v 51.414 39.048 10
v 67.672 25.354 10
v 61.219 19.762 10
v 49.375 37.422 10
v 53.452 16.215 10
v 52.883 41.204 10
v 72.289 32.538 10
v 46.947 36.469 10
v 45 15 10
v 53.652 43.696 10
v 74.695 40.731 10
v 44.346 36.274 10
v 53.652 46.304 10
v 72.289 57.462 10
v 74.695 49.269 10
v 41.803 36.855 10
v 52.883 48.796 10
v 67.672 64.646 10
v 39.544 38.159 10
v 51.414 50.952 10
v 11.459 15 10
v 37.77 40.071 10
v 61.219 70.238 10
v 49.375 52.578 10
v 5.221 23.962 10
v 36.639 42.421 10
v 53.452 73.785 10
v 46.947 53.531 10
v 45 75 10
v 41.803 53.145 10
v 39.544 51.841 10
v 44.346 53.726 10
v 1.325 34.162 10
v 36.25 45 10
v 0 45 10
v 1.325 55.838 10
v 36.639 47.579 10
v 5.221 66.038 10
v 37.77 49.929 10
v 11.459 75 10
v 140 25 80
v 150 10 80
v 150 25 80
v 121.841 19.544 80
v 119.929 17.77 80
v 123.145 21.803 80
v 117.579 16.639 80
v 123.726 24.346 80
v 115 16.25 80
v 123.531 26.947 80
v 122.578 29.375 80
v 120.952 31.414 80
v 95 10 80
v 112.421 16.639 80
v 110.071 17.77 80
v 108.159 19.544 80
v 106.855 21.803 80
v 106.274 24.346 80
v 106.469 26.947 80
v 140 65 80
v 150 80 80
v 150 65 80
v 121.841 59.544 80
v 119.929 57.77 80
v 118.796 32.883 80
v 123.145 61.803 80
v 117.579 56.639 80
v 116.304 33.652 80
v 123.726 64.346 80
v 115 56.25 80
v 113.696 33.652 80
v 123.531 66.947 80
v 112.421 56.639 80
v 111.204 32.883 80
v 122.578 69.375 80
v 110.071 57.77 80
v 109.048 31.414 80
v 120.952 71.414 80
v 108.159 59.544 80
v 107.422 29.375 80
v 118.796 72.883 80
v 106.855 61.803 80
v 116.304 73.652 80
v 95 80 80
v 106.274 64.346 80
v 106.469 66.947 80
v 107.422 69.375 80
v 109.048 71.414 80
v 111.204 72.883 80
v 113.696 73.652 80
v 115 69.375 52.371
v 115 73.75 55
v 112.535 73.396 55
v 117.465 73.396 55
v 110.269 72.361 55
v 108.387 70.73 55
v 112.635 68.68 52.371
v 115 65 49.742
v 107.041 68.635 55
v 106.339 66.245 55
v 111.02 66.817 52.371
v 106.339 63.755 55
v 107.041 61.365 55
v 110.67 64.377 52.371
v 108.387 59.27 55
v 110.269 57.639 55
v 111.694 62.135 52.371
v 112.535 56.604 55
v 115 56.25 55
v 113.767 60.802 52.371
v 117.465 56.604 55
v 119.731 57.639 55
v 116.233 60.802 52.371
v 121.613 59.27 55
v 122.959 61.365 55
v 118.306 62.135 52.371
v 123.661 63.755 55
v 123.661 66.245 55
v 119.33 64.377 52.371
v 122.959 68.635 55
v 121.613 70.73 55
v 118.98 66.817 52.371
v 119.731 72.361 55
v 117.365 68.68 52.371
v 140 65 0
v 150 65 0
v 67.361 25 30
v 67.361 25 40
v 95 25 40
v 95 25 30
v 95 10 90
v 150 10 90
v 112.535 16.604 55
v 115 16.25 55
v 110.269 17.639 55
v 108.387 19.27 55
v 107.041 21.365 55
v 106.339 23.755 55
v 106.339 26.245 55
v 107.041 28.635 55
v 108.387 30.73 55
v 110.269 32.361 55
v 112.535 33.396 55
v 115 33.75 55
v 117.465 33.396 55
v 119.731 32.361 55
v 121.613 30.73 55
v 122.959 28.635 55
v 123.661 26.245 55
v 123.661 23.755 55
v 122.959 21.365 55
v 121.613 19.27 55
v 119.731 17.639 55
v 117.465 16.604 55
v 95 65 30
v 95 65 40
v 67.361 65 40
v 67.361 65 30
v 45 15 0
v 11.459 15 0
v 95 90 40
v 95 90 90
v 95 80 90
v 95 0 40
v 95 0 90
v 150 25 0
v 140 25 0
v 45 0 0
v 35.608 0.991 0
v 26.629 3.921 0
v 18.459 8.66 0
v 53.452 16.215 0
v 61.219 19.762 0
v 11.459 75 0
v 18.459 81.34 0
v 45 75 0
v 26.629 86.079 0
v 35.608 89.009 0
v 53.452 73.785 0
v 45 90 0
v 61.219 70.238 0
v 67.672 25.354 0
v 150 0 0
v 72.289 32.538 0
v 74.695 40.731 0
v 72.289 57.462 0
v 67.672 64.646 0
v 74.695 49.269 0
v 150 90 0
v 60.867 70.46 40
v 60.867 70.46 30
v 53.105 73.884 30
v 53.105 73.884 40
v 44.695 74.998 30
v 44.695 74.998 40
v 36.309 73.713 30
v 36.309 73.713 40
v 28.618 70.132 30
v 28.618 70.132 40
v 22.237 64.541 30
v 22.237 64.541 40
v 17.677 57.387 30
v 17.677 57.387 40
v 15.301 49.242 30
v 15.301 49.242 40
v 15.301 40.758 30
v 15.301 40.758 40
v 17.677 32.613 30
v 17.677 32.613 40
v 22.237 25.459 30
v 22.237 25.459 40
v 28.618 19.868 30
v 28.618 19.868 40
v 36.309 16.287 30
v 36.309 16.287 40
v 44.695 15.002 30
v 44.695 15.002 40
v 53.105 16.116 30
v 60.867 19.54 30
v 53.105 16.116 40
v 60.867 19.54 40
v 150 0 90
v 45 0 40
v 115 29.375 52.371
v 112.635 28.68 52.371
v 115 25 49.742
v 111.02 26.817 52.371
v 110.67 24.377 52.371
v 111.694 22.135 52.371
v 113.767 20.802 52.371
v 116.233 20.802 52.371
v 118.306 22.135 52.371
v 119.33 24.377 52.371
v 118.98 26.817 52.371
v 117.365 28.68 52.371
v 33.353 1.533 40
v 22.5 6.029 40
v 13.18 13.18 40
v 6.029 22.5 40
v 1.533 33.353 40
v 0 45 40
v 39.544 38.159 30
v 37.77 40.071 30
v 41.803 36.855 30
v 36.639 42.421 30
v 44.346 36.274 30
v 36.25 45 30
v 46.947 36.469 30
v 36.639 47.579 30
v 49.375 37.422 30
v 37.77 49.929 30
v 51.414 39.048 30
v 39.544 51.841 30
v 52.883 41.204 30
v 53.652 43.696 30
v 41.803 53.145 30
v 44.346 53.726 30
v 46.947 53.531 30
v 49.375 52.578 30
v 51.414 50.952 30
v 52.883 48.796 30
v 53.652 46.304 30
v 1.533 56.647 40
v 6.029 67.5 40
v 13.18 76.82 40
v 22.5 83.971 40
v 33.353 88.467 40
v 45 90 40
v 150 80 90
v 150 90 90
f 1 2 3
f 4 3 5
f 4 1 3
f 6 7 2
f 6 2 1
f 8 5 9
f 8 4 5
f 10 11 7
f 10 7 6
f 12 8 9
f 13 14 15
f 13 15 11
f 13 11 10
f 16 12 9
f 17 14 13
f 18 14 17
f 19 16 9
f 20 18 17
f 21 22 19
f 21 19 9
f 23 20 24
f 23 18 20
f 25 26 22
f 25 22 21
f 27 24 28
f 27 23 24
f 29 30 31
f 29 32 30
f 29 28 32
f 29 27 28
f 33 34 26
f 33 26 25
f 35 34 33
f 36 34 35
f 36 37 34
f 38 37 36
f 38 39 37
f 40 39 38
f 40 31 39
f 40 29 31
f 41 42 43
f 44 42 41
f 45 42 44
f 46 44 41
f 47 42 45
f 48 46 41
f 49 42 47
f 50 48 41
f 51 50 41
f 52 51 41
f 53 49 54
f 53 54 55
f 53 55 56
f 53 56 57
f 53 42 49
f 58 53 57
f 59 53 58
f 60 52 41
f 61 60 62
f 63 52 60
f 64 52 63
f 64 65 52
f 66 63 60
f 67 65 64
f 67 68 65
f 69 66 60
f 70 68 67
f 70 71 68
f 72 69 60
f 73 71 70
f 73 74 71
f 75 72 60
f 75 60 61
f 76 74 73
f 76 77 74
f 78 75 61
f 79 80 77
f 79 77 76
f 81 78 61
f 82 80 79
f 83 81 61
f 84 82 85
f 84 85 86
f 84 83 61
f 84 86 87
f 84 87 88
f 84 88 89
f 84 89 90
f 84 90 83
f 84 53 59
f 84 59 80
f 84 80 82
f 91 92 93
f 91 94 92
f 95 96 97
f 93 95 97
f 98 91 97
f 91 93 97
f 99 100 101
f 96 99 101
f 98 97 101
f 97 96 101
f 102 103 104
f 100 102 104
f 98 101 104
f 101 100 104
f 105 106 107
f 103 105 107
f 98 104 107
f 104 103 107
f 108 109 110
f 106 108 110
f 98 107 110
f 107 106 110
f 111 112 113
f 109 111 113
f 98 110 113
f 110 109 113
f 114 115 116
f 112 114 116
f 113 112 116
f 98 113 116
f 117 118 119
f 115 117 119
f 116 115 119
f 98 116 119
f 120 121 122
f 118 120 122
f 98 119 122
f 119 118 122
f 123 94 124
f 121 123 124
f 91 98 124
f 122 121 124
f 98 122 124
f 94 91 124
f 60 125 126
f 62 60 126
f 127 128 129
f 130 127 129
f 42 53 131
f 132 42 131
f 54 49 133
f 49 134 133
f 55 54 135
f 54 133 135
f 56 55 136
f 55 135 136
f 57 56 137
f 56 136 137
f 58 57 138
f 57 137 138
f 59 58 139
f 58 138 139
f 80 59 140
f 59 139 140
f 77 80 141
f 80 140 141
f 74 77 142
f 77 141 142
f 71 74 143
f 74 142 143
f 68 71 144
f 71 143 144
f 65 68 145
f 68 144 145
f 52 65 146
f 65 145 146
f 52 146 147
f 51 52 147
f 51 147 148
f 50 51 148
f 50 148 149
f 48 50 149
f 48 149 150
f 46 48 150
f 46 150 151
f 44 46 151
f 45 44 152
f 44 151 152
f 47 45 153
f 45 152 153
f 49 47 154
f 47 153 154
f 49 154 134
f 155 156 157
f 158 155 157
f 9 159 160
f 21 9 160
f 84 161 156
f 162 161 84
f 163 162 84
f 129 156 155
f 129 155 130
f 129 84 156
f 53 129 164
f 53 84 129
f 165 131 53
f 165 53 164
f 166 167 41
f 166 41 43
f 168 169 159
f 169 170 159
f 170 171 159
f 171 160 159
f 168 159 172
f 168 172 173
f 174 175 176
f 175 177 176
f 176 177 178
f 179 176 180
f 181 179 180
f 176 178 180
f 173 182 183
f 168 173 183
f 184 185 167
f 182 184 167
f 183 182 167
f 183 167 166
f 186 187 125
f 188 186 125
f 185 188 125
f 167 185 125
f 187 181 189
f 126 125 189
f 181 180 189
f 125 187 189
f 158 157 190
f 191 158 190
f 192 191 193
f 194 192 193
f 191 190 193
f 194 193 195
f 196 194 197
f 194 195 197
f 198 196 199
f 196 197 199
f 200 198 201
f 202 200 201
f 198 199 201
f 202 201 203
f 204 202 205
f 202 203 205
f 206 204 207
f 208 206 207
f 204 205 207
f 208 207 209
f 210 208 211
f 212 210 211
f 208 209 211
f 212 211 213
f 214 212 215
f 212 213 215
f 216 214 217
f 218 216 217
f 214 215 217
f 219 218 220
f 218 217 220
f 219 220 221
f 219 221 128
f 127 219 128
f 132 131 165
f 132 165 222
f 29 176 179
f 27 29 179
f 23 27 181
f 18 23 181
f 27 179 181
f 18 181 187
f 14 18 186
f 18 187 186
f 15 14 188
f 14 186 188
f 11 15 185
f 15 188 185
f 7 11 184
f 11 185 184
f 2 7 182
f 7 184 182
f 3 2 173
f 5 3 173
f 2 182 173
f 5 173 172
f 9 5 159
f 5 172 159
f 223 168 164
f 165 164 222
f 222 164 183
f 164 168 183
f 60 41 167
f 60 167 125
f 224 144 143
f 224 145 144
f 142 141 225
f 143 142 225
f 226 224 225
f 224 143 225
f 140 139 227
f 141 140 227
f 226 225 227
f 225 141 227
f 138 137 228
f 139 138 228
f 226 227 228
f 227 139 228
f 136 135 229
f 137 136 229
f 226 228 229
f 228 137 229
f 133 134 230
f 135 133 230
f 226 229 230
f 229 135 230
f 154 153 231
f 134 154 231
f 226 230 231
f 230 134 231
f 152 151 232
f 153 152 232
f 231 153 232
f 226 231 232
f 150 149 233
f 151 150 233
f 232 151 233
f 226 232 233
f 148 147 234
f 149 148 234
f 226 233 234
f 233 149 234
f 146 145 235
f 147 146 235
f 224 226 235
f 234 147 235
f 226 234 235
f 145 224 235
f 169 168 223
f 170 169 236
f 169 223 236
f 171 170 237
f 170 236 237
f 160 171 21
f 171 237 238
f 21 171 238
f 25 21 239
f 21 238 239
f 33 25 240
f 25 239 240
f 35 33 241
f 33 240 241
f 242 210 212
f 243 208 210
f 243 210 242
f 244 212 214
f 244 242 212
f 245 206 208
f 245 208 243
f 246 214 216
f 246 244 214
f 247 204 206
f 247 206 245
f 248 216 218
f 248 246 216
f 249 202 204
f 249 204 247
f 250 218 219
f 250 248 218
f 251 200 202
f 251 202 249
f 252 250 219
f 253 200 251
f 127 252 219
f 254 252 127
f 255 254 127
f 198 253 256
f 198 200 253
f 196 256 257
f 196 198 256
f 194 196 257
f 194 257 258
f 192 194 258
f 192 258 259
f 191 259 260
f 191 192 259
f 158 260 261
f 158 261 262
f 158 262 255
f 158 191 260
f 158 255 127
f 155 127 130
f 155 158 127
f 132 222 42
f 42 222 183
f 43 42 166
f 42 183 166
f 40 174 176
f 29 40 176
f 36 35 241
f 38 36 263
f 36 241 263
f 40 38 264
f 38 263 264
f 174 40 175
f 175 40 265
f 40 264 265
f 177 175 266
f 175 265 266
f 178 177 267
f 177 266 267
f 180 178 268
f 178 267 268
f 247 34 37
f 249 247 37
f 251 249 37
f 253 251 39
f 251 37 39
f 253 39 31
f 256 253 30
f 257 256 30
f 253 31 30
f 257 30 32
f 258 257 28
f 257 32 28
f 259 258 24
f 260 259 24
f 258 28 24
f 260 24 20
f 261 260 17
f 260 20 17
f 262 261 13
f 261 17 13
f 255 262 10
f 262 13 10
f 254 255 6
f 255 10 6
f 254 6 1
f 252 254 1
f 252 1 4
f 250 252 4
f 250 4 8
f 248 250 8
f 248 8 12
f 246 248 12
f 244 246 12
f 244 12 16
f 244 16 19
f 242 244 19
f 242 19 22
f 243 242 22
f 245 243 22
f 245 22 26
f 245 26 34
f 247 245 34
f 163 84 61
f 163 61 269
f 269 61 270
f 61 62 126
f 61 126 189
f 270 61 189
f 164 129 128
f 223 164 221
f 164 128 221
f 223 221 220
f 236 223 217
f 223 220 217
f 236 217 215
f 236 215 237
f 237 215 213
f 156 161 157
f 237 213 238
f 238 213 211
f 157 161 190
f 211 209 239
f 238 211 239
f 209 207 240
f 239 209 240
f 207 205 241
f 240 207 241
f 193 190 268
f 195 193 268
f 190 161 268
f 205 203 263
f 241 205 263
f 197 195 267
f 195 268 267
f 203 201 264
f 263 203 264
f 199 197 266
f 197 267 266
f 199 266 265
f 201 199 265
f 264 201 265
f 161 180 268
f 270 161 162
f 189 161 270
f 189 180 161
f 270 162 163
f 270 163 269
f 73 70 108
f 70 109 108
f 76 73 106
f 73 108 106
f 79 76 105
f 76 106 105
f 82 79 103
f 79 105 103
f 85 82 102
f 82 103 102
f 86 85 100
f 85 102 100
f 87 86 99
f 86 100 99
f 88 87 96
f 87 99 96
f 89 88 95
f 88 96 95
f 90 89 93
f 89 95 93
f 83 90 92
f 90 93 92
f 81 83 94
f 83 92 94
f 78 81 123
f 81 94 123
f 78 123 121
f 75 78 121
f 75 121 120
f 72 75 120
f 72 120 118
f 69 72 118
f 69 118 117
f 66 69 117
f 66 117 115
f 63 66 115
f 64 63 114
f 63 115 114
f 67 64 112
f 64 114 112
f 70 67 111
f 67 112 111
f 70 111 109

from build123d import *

# Parameters (mm, degrees)
SKETCH1_W              = 150
SKETCH1_H              = 90
BOSS_EXTRUDE1_DEPTH    = 90
SKETCH2_W              = 10
SKETCH2_H              = 40
CUT_EXTRUDE1_DEPTH     = 90
CUT_EXTRUDE2_DEPTH     = 90
CUT_EXTRUDE3_DEPTH     = 10
CUT_EXTRUDE4_DEPTH     = 50
SKETCH6_W              = 10
SKETCH6_H              = 70
CUT_EXTRUDE6_DEPTH     = 94
SKETCH7_R              = 30
CUT_EXTRUDE8_DEPTH     = 10
M20_TAPPED_HOLE2_D     = 17.5
M20_TAPPED_HOLE2_DEPTH = 25
M20_TAPPED_HOLE2_TIP   = 5.257530416
M20_TAPPED_HOLE3_D     = 17.5
M20_TAPPED_HOLE3_DEPTH = 37.5
M20_TAPPED_HOLE3_TIP   = 5.257530416


with BuildPart() as part:
    # Sketch1 → Boss-Extrude1 (new body)
    with BuildSketch(Plane.XY):
        with Locations((75, 45)):
            Rectangle(SKETCH1_W, SKETCH1_H)
    extrude(amount=BOSS_EXTRUDE1_DEPTH)

    # Sketch2 → Cut-Extrude1 (cut)
    with BuildSketch(Plane.XY.offset(90)):
        with Locations((145, 45)):
            Rectangle(SKETCH2_W, SKETCH2_H)
    extrude(amount=-CUT_EXTRUDE1_DEPTH, mode=Mode.SUBTRACT)

    # Sketch3 → Cut-Extrude2 (cut)
    with BuildSketch(Plane.XY.offset(90)):
        with BuildLine():
            ThreePointArc((0, 45), (13.180194847, 76.819805153), (45, 90))
            Line((45, 90), (0, 90))
            Line((0, 90), (0, 45))
        make_face()
        with BuildLine():
            ThreePointArc((45, 0), (13.180194847, 13.180194847), (0, 45))
            Line((0, 45), (0, 0))
            Line((0, 0), (45, 0))
        make_face()
    extrude(amount=-CUT_EXTRUDE2_DEPTH, mode=Mode.SUBTRACT)

    # Sketch4 → Cut-Extrude3 (cut)
    with BuildSketch(Plane(origin=(0, 0, 0), x_dir=(-1, 0, 0), z_dir=(0, 0, -1))):
        with BuildLine():
            ThreePointArc((-11.458980338, 15), (0, 45), (-11.458980338, 75))
            Line((-11.458980338, 75), (-45, 75))
            ThreePointArc((-45, 75), (-75, 45), (-45, 15))
            Line((-45, 15), (-11.458980338, 15))
        make_face()
    extrude(amount=-CUT_EXTRUDE3_DEPTH, mode=Mode.SUBTRACT)

    # Sketch5 → Cut-Extrude4 (cut)
    with BuildSketch(Plane.XY.offset(90)):
        with BuildLine():
            Line((95, 90), (95, 0))
            Line((95, 0), (45, 0))
            ThreePointArc((45, 0), (0, 45), (45, 90))
            Line((45, 90), (95, 90))
        make_face()
    extrude(amount=-CUT_EXTRUDE4_DEPTH, mode=Mode.SUBTRACT)

    # Sketch6 → Cut-Extrude6 (cut)
    with BuildSketch(Plane.ZY.offset(-95)):
        with Locations((85, 45)):
            Rectangle(SKETCH6_W, SKETCH6_H)
    extrude(amount=-CUT_EXTRUDE6_DEPTH, mode=Mode.SUBTRACT)

    # Sketch7 → Cut-Extrude8 (cut)
    with BuildSketch(Plane.XY.offset(40)):
        with Locations((45, 45)):
            Circle(SKETCH7_R)
        with BuildLine():
            Line((95, 65), (67.360679775, 65))
            ThreePointArc((67.360679775, 65), (73.025170769, 55.704662693), (75, 45))
            ThreePointArc((75, 45), (73.025170769, 34.295337307), (67.360679775, 25))
            Line((67.360679775, 25), (95, 25))
            Line((95, 25), (95, 65))
        make_face()
    extrude(amount=-CUT_EXTRUDE8_DEPTH, mode=Mode.SUBTRACT)

    # M20 Tapped Hole2
    with Locations(Plane(origin=(115, 65, 80), x_dir=(0, 1, 0), z_dir=(0, 0, 1))):
        with Locations((0, 0), (-40, 0)):
            Hole(M20_TAPPED_HOLE2_D / 2, depth=M20_TAPPED_HOLE2_DEPTH)
            with Locations((0, 0, -(M20_TAPPED_HOLE2_DEPTH + M20_TAPPED_HOLE2_TIP / 2))):  # 118° drill point
                Cone(0, M20_TAPPED_HOLE2_D / 2, M20_TAPPED_HOLE2_TIP, mode=Mode.SUBTRACT)

    # M20 Tapped Hole3
    with Locations(Plane(origin=(45, 45, 40), x_dir=(1, 0, 0), z_dir=(0, 0, 1))):
        with Locations((0, 0)):
            Hole(M20_TAPPED_HOLE3_D / 2, depth=M20_TAPPED_HOLE3_DEPTH)
            with Locations((0, 0, -(M20_TAPPED_HOLE3_DEPTH + M20_TAPPED_HOLE3_TIP / 2))):  # 118° drill point
                Cone(0, M20_TAPPED_HOLE3_D / 2, M20_TAPPED_HOLE3_TIP, mode=Mode.SUBTRACT)


solid = part.part
